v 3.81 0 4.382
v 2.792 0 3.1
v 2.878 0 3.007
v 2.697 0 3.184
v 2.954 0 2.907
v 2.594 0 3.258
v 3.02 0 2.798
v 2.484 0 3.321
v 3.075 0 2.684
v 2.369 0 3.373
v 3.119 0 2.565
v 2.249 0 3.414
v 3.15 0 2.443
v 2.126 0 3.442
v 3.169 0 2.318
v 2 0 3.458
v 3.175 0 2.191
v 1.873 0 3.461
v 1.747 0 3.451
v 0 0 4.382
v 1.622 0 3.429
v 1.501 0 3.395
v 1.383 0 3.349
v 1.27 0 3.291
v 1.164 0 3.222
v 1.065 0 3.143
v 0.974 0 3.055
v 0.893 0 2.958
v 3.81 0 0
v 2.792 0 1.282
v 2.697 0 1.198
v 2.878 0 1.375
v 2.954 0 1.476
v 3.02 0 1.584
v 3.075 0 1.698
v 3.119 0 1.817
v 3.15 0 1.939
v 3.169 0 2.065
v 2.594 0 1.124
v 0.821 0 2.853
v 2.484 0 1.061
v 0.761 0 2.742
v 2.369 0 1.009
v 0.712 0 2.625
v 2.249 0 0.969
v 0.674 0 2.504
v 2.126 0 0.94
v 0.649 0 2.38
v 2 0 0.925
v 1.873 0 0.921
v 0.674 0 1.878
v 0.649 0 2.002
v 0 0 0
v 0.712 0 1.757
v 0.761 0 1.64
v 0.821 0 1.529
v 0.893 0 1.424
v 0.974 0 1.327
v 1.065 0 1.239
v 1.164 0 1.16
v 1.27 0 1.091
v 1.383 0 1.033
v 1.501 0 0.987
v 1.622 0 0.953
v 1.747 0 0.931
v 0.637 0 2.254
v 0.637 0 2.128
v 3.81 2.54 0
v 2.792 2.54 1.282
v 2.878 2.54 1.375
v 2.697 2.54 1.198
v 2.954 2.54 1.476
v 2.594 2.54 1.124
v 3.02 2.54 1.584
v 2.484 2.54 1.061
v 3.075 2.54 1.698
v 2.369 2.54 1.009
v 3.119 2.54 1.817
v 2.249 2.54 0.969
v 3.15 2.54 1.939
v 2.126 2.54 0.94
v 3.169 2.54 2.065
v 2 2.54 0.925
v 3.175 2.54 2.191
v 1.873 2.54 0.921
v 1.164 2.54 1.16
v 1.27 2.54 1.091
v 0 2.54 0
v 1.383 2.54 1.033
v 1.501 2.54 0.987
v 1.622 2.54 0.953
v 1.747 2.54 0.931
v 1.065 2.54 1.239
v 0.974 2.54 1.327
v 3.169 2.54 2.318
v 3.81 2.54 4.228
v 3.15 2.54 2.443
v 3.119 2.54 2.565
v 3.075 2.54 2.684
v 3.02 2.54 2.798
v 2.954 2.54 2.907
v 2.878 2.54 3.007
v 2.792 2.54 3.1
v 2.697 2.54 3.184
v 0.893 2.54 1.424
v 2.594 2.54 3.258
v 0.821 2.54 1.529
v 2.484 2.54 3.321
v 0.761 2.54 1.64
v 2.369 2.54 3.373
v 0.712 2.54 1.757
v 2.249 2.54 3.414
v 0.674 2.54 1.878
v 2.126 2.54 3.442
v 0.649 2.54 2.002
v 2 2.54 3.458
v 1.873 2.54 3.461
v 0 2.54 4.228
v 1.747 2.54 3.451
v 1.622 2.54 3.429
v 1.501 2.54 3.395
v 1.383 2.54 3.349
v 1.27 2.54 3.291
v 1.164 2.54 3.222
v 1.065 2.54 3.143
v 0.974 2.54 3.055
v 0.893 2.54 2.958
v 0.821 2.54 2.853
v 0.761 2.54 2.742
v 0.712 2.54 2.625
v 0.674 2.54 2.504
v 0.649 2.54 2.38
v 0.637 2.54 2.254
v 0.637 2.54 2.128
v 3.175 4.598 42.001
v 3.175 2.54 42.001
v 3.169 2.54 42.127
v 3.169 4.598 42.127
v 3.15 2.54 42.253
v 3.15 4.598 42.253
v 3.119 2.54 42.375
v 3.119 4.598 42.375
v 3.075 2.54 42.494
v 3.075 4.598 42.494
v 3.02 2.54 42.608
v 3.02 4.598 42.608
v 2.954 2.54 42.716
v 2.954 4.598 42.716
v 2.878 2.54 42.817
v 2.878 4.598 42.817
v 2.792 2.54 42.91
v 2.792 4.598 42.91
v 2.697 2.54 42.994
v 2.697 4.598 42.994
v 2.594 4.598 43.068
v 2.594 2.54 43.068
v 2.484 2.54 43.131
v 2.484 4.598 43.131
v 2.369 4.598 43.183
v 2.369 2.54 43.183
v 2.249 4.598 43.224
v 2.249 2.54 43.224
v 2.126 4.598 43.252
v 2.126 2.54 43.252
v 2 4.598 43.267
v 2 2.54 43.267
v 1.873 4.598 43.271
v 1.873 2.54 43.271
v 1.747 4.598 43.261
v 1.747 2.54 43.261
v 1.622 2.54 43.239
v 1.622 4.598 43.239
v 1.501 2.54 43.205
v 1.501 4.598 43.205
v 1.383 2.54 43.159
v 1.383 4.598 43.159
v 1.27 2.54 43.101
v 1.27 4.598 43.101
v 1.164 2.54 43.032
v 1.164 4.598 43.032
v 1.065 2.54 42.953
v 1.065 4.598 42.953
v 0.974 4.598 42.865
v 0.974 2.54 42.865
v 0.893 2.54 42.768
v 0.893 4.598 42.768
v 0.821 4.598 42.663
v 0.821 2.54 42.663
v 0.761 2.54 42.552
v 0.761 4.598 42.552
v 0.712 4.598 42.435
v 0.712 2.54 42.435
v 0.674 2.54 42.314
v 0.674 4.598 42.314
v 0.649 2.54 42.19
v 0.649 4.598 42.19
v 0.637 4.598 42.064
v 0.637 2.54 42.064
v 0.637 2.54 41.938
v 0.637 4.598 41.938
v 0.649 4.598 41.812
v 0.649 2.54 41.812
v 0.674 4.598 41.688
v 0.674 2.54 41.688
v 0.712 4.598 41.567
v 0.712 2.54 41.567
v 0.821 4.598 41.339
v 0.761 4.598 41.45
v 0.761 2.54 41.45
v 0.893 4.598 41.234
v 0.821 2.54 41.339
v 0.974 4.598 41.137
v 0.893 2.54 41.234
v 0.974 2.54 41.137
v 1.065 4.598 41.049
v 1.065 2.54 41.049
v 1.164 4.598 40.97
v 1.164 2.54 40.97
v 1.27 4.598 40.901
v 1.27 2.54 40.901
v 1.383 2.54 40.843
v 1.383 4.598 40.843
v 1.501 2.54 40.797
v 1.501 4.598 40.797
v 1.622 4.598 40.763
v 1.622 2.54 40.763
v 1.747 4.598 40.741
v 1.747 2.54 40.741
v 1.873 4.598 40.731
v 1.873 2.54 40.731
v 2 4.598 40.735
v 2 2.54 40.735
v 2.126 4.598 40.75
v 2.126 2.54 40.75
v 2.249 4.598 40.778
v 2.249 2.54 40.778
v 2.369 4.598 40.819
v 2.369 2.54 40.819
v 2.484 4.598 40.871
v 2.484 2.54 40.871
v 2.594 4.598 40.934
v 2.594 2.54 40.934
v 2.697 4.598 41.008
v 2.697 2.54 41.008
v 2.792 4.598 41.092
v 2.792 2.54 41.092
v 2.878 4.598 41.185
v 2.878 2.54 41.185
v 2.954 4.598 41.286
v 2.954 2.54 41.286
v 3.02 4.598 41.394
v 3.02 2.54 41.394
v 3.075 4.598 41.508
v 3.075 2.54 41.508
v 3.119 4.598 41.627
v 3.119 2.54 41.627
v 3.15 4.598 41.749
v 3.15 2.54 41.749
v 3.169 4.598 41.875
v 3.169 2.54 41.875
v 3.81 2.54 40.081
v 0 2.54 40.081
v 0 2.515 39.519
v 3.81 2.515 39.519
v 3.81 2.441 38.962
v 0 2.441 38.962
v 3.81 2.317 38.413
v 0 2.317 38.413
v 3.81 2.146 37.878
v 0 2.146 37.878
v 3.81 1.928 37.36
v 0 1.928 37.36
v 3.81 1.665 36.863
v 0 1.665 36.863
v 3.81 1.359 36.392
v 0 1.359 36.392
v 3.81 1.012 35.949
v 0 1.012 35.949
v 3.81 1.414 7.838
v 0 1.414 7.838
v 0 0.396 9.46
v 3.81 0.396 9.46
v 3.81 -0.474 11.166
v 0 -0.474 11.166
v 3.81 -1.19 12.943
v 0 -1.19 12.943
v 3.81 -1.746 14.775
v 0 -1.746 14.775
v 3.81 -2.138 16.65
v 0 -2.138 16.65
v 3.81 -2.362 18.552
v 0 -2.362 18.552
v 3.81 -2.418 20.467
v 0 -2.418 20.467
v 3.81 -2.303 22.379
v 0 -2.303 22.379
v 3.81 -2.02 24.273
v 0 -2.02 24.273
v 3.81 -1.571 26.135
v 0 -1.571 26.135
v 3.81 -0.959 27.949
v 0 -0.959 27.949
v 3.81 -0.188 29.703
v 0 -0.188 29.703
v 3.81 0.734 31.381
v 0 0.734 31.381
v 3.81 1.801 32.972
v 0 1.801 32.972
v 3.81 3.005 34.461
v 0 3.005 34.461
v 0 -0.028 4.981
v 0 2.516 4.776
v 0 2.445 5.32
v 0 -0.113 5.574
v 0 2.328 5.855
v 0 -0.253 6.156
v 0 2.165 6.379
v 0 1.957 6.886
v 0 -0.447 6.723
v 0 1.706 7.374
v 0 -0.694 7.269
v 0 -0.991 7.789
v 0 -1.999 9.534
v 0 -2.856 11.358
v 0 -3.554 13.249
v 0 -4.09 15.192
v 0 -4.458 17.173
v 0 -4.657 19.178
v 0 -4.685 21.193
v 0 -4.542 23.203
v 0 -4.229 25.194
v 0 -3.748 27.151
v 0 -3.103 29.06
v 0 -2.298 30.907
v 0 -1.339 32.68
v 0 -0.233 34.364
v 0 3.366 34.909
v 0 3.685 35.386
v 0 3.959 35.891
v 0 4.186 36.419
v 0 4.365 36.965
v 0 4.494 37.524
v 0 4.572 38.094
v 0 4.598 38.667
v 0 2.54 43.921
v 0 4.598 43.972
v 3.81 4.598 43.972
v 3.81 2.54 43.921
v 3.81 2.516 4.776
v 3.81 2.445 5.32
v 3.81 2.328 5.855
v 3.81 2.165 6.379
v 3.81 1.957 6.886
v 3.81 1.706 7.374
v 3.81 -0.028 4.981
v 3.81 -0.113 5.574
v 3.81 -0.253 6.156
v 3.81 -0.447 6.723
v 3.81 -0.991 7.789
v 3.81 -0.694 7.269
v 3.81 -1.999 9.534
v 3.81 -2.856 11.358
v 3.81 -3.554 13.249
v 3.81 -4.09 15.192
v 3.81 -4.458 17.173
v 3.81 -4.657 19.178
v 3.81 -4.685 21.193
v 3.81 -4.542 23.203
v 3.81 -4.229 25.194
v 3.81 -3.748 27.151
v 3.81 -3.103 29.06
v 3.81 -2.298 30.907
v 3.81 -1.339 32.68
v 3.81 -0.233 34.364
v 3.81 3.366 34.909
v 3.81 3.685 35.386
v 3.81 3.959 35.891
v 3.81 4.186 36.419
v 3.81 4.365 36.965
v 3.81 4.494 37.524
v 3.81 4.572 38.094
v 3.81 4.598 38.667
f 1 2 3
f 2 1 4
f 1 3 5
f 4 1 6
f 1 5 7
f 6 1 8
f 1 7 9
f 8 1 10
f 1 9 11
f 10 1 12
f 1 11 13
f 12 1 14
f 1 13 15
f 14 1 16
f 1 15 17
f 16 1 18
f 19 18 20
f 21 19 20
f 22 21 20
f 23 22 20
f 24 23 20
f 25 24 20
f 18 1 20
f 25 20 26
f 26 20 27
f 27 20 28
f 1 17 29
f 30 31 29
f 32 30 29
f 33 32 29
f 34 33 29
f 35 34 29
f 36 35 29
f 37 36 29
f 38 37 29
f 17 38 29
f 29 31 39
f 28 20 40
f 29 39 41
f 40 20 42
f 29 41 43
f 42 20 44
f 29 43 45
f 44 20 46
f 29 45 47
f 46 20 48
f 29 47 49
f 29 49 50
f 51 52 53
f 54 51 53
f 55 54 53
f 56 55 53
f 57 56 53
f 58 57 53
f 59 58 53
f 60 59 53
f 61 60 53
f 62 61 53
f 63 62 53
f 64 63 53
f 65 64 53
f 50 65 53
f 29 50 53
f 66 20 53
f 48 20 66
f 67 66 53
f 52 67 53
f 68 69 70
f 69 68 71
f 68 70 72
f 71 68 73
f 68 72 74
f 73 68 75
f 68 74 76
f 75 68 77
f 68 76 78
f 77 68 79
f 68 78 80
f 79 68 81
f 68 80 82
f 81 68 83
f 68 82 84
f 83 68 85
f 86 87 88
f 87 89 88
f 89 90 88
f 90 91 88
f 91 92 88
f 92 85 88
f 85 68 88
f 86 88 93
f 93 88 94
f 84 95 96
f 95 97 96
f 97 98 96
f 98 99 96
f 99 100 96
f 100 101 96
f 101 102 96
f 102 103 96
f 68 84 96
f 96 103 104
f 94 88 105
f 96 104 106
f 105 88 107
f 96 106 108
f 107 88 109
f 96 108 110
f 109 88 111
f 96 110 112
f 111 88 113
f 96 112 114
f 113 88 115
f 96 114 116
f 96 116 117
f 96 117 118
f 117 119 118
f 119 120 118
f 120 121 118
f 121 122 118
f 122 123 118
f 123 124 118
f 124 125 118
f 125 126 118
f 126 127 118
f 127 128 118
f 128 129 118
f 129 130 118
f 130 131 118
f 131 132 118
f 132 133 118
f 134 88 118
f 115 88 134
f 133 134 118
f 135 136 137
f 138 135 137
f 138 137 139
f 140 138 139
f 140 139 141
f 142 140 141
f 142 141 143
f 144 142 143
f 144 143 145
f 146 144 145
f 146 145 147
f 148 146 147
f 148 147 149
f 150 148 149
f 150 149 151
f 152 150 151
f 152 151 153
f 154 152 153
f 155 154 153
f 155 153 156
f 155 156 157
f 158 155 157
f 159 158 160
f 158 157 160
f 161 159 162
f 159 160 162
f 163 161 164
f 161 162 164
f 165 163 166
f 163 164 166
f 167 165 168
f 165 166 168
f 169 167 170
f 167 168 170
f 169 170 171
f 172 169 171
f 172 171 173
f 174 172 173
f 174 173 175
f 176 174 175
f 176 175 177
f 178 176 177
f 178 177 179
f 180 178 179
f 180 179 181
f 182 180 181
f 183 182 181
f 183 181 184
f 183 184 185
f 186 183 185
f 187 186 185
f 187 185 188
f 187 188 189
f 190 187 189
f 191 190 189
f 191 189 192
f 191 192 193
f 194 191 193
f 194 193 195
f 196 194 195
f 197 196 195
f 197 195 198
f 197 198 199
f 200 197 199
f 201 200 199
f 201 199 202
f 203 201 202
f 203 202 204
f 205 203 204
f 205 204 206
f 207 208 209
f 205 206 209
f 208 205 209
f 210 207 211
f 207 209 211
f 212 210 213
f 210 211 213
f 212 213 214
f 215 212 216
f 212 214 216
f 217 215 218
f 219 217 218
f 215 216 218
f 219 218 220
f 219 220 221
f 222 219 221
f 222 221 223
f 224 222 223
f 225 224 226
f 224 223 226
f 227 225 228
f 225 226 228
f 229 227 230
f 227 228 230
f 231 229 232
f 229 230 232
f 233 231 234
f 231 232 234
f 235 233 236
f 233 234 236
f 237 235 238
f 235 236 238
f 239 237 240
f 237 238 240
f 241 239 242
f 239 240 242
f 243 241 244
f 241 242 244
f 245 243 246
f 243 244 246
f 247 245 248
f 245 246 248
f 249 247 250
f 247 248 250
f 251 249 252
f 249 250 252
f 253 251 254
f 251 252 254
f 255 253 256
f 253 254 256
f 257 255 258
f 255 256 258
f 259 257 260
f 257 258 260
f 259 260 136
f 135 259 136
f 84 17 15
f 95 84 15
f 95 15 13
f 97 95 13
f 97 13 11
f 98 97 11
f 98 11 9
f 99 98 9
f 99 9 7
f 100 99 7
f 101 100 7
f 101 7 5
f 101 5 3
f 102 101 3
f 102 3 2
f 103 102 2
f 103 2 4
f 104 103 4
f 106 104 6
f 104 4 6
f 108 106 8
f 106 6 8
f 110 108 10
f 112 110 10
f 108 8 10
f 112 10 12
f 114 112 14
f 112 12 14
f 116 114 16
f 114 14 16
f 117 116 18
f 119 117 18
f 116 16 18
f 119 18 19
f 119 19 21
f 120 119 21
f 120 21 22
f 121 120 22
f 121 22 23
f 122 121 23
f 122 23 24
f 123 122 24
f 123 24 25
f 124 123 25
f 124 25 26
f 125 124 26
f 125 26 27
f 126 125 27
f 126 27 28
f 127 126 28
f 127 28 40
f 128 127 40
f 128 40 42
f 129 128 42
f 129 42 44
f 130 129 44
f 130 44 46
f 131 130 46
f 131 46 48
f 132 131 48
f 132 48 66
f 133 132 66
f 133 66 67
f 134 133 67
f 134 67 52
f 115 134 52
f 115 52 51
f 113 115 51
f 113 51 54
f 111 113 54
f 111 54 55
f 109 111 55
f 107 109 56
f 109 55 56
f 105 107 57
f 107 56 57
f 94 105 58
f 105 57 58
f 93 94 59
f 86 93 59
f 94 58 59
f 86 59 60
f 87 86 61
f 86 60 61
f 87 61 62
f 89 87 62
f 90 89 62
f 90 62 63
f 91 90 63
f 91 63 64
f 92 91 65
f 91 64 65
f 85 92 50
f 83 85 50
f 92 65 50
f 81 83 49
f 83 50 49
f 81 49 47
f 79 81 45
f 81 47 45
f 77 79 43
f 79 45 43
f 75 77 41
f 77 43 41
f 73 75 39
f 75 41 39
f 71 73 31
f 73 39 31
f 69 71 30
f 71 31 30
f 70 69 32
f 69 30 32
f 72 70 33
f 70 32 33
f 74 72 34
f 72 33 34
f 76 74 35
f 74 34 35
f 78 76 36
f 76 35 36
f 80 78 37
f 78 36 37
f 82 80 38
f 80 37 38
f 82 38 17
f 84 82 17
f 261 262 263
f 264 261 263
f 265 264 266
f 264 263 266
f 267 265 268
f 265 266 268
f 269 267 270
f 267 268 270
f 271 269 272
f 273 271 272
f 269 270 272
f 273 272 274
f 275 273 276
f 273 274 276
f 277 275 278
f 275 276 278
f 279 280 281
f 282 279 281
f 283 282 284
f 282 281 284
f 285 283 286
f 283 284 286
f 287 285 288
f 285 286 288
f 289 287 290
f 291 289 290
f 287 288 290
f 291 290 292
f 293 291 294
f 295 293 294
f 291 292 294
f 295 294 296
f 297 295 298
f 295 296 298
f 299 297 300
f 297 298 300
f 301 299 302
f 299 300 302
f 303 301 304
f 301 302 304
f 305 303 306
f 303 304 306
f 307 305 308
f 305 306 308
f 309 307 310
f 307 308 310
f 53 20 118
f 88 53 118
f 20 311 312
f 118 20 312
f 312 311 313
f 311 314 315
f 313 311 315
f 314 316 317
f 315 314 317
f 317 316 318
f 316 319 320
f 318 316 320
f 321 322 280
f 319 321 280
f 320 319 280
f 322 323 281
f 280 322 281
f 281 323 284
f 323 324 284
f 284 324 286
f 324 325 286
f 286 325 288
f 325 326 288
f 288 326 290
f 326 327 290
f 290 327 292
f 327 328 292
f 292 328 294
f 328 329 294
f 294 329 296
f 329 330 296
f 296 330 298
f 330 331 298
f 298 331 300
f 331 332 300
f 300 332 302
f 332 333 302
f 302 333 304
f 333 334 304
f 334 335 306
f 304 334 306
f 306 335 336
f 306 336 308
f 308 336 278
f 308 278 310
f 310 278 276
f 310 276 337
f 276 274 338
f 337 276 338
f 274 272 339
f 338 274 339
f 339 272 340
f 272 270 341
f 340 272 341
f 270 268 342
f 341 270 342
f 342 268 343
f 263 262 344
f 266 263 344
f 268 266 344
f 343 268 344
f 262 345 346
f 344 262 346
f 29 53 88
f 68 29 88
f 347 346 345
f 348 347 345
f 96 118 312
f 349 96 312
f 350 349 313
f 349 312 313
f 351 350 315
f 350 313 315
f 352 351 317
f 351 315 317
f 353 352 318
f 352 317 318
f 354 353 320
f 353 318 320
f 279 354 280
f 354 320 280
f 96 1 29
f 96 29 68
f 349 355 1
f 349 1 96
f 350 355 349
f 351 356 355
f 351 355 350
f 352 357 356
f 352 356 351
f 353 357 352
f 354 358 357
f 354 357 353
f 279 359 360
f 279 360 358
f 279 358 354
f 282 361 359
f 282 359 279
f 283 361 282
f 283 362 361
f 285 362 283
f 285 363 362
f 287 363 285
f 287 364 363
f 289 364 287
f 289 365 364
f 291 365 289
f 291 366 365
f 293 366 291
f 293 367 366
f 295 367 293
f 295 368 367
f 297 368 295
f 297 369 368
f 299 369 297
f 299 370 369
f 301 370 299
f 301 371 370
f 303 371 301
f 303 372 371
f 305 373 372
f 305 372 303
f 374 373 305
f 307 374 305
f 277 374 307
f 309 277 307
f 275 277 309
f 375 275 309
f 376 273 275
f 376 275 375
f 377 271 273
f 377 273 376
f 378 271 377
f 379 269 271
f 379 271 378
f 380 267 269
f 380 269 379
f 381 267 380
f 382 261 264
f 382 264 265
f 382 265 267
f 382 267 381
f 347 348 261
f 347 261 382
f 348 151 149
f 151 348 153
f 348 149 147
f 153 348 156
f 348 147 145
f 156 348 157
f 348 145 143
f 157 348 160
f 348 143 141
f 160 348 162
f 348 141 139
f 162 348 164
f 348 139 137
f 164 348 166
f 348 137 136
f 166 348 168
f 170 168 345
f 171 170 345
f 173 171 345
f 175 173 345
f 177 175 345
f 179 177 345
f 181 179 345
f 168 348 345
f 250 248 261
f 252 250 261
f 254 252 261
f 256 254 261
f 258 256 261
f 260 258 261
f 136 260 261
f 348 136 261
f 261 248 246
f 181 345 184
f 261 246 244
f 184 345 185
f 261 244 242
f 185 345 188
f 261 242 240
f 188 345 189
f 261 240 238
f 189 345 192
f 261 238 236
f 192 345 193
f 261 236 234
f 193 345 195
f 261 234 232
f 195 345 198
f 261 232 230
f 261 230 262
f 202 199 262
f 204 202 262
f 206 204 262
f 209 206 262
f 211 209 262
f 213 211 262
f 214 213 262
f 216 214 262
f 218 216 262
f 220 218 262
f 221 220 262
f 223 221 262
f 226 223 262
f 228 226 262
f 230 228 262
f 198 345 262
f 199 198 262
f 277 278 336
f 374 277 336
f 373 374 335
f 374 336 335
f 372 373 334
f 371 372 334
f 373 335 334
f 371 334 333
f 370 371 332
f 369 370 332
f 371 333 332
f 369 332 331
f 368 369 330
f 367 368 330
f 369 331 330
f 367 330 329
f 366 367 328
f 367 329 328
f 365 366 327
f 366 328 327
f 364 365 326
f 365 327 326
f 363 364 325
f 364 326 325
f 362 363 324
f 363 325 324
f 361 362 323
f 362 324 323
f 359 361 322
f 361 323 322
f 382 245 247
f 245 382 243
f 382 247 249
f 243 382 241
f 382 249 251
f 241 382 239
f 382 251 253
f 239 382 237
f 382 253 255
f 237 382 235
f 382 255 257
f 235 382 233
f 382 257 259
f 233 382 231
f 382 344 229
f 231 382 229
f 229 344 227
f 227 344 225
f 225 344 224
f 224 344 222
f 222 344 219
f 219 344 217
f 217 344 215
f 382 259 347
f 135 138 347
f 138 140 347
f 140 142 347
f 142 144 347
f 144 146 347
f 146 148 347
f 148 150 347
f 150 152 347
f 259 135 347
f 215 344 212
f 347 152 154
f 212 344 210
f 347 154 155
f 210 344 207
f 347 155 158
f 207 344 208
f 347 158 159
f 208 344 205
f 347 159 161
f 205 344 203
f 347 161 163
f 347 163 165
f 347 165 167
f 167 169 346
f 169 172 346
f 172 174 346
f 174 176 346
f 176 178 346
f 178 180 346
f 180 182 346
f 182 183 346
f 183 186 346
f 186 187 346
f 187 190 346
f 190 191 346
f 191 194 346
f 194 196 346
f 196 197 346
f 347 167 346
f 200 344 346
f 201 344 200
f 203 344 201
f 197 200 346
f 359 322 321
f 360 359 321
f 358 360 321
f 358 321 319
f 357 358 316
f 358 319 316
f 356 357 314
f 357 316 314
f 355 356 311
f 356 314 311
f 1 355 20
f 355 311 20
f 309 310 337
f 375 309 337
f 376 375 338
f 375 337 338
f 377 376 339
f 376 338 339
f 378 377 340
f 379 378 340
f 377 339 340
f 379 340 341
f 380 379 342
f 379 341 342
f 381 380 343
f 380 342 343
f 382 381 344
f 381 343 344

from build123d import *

# Parameters (mm, degrees)
F1_DEPTH = 3.81
F2_R     = 1.27
F3_DEPTH = 25.4
F4_R     = 1.27
F5_DEPTH = 9.4996


with BuildPart() as f1:
    # F0 (on Right) → F1 (new body)
    with BuildSketch(Plane.YZ):
        with BuildLine():
            Line((0, 4.382191), (0, 0))
            Line((0, 0), (2.54, 0))
            Line((2.54, 0), (2.54, 4.228206))
            ThreePointArc((2.54, 4.228206), (2.252063, 6.118681), (1.414363, 7.837711))
            ThreePointArc((1.414363, 7.837711), (-2.381643, 21.423937), (3.005292, 34.461426))
            ThreePointArc((3.005292, 34.461426), (4.186454, 36.41869), (4.597952, 38.667399))
            Line((4.597952, 38.667399), (4.597952, 43.971926))
            Line((4.597952, 43.971926), (2.54, 43.9214))
            Line((2.54, 43.9214), (2.54, 40.08054))
            ThreePointArc((2.54, 40.08054), (2.145807, 37.878073), (1.01217, 35.949054))
            ThreePointArc((1.01217, 35.949054), (-4.635087, 22.199709), (-0.991445, 7.7893))
            ThreePointArc((-0.991445, 7.7893), (-0.252897, 6.156406), (0, 4.382191))
        make_face()
    extrude(amount=F1_DEPTH)

    # F2 (on face) → F3 (cut)
    with BuildSketch(Plane.XZ.offset(-2.54)):
        with Locations((1.905, 42.00097)):
            Circle(F2_R)
    extrude(amount=-F3_DEPTH, mode=Mode.SUBTRACT)

    # F4 (on face) → F5 (cut)
    with BuildSketch(Plane.XZ):
        with Locations((1.905, 2.191095)):
            Circle(F4_R)
    extrude(amount=-F5_DEPTH, mode=Mode.SUBTRACT)


solid = f1.part
